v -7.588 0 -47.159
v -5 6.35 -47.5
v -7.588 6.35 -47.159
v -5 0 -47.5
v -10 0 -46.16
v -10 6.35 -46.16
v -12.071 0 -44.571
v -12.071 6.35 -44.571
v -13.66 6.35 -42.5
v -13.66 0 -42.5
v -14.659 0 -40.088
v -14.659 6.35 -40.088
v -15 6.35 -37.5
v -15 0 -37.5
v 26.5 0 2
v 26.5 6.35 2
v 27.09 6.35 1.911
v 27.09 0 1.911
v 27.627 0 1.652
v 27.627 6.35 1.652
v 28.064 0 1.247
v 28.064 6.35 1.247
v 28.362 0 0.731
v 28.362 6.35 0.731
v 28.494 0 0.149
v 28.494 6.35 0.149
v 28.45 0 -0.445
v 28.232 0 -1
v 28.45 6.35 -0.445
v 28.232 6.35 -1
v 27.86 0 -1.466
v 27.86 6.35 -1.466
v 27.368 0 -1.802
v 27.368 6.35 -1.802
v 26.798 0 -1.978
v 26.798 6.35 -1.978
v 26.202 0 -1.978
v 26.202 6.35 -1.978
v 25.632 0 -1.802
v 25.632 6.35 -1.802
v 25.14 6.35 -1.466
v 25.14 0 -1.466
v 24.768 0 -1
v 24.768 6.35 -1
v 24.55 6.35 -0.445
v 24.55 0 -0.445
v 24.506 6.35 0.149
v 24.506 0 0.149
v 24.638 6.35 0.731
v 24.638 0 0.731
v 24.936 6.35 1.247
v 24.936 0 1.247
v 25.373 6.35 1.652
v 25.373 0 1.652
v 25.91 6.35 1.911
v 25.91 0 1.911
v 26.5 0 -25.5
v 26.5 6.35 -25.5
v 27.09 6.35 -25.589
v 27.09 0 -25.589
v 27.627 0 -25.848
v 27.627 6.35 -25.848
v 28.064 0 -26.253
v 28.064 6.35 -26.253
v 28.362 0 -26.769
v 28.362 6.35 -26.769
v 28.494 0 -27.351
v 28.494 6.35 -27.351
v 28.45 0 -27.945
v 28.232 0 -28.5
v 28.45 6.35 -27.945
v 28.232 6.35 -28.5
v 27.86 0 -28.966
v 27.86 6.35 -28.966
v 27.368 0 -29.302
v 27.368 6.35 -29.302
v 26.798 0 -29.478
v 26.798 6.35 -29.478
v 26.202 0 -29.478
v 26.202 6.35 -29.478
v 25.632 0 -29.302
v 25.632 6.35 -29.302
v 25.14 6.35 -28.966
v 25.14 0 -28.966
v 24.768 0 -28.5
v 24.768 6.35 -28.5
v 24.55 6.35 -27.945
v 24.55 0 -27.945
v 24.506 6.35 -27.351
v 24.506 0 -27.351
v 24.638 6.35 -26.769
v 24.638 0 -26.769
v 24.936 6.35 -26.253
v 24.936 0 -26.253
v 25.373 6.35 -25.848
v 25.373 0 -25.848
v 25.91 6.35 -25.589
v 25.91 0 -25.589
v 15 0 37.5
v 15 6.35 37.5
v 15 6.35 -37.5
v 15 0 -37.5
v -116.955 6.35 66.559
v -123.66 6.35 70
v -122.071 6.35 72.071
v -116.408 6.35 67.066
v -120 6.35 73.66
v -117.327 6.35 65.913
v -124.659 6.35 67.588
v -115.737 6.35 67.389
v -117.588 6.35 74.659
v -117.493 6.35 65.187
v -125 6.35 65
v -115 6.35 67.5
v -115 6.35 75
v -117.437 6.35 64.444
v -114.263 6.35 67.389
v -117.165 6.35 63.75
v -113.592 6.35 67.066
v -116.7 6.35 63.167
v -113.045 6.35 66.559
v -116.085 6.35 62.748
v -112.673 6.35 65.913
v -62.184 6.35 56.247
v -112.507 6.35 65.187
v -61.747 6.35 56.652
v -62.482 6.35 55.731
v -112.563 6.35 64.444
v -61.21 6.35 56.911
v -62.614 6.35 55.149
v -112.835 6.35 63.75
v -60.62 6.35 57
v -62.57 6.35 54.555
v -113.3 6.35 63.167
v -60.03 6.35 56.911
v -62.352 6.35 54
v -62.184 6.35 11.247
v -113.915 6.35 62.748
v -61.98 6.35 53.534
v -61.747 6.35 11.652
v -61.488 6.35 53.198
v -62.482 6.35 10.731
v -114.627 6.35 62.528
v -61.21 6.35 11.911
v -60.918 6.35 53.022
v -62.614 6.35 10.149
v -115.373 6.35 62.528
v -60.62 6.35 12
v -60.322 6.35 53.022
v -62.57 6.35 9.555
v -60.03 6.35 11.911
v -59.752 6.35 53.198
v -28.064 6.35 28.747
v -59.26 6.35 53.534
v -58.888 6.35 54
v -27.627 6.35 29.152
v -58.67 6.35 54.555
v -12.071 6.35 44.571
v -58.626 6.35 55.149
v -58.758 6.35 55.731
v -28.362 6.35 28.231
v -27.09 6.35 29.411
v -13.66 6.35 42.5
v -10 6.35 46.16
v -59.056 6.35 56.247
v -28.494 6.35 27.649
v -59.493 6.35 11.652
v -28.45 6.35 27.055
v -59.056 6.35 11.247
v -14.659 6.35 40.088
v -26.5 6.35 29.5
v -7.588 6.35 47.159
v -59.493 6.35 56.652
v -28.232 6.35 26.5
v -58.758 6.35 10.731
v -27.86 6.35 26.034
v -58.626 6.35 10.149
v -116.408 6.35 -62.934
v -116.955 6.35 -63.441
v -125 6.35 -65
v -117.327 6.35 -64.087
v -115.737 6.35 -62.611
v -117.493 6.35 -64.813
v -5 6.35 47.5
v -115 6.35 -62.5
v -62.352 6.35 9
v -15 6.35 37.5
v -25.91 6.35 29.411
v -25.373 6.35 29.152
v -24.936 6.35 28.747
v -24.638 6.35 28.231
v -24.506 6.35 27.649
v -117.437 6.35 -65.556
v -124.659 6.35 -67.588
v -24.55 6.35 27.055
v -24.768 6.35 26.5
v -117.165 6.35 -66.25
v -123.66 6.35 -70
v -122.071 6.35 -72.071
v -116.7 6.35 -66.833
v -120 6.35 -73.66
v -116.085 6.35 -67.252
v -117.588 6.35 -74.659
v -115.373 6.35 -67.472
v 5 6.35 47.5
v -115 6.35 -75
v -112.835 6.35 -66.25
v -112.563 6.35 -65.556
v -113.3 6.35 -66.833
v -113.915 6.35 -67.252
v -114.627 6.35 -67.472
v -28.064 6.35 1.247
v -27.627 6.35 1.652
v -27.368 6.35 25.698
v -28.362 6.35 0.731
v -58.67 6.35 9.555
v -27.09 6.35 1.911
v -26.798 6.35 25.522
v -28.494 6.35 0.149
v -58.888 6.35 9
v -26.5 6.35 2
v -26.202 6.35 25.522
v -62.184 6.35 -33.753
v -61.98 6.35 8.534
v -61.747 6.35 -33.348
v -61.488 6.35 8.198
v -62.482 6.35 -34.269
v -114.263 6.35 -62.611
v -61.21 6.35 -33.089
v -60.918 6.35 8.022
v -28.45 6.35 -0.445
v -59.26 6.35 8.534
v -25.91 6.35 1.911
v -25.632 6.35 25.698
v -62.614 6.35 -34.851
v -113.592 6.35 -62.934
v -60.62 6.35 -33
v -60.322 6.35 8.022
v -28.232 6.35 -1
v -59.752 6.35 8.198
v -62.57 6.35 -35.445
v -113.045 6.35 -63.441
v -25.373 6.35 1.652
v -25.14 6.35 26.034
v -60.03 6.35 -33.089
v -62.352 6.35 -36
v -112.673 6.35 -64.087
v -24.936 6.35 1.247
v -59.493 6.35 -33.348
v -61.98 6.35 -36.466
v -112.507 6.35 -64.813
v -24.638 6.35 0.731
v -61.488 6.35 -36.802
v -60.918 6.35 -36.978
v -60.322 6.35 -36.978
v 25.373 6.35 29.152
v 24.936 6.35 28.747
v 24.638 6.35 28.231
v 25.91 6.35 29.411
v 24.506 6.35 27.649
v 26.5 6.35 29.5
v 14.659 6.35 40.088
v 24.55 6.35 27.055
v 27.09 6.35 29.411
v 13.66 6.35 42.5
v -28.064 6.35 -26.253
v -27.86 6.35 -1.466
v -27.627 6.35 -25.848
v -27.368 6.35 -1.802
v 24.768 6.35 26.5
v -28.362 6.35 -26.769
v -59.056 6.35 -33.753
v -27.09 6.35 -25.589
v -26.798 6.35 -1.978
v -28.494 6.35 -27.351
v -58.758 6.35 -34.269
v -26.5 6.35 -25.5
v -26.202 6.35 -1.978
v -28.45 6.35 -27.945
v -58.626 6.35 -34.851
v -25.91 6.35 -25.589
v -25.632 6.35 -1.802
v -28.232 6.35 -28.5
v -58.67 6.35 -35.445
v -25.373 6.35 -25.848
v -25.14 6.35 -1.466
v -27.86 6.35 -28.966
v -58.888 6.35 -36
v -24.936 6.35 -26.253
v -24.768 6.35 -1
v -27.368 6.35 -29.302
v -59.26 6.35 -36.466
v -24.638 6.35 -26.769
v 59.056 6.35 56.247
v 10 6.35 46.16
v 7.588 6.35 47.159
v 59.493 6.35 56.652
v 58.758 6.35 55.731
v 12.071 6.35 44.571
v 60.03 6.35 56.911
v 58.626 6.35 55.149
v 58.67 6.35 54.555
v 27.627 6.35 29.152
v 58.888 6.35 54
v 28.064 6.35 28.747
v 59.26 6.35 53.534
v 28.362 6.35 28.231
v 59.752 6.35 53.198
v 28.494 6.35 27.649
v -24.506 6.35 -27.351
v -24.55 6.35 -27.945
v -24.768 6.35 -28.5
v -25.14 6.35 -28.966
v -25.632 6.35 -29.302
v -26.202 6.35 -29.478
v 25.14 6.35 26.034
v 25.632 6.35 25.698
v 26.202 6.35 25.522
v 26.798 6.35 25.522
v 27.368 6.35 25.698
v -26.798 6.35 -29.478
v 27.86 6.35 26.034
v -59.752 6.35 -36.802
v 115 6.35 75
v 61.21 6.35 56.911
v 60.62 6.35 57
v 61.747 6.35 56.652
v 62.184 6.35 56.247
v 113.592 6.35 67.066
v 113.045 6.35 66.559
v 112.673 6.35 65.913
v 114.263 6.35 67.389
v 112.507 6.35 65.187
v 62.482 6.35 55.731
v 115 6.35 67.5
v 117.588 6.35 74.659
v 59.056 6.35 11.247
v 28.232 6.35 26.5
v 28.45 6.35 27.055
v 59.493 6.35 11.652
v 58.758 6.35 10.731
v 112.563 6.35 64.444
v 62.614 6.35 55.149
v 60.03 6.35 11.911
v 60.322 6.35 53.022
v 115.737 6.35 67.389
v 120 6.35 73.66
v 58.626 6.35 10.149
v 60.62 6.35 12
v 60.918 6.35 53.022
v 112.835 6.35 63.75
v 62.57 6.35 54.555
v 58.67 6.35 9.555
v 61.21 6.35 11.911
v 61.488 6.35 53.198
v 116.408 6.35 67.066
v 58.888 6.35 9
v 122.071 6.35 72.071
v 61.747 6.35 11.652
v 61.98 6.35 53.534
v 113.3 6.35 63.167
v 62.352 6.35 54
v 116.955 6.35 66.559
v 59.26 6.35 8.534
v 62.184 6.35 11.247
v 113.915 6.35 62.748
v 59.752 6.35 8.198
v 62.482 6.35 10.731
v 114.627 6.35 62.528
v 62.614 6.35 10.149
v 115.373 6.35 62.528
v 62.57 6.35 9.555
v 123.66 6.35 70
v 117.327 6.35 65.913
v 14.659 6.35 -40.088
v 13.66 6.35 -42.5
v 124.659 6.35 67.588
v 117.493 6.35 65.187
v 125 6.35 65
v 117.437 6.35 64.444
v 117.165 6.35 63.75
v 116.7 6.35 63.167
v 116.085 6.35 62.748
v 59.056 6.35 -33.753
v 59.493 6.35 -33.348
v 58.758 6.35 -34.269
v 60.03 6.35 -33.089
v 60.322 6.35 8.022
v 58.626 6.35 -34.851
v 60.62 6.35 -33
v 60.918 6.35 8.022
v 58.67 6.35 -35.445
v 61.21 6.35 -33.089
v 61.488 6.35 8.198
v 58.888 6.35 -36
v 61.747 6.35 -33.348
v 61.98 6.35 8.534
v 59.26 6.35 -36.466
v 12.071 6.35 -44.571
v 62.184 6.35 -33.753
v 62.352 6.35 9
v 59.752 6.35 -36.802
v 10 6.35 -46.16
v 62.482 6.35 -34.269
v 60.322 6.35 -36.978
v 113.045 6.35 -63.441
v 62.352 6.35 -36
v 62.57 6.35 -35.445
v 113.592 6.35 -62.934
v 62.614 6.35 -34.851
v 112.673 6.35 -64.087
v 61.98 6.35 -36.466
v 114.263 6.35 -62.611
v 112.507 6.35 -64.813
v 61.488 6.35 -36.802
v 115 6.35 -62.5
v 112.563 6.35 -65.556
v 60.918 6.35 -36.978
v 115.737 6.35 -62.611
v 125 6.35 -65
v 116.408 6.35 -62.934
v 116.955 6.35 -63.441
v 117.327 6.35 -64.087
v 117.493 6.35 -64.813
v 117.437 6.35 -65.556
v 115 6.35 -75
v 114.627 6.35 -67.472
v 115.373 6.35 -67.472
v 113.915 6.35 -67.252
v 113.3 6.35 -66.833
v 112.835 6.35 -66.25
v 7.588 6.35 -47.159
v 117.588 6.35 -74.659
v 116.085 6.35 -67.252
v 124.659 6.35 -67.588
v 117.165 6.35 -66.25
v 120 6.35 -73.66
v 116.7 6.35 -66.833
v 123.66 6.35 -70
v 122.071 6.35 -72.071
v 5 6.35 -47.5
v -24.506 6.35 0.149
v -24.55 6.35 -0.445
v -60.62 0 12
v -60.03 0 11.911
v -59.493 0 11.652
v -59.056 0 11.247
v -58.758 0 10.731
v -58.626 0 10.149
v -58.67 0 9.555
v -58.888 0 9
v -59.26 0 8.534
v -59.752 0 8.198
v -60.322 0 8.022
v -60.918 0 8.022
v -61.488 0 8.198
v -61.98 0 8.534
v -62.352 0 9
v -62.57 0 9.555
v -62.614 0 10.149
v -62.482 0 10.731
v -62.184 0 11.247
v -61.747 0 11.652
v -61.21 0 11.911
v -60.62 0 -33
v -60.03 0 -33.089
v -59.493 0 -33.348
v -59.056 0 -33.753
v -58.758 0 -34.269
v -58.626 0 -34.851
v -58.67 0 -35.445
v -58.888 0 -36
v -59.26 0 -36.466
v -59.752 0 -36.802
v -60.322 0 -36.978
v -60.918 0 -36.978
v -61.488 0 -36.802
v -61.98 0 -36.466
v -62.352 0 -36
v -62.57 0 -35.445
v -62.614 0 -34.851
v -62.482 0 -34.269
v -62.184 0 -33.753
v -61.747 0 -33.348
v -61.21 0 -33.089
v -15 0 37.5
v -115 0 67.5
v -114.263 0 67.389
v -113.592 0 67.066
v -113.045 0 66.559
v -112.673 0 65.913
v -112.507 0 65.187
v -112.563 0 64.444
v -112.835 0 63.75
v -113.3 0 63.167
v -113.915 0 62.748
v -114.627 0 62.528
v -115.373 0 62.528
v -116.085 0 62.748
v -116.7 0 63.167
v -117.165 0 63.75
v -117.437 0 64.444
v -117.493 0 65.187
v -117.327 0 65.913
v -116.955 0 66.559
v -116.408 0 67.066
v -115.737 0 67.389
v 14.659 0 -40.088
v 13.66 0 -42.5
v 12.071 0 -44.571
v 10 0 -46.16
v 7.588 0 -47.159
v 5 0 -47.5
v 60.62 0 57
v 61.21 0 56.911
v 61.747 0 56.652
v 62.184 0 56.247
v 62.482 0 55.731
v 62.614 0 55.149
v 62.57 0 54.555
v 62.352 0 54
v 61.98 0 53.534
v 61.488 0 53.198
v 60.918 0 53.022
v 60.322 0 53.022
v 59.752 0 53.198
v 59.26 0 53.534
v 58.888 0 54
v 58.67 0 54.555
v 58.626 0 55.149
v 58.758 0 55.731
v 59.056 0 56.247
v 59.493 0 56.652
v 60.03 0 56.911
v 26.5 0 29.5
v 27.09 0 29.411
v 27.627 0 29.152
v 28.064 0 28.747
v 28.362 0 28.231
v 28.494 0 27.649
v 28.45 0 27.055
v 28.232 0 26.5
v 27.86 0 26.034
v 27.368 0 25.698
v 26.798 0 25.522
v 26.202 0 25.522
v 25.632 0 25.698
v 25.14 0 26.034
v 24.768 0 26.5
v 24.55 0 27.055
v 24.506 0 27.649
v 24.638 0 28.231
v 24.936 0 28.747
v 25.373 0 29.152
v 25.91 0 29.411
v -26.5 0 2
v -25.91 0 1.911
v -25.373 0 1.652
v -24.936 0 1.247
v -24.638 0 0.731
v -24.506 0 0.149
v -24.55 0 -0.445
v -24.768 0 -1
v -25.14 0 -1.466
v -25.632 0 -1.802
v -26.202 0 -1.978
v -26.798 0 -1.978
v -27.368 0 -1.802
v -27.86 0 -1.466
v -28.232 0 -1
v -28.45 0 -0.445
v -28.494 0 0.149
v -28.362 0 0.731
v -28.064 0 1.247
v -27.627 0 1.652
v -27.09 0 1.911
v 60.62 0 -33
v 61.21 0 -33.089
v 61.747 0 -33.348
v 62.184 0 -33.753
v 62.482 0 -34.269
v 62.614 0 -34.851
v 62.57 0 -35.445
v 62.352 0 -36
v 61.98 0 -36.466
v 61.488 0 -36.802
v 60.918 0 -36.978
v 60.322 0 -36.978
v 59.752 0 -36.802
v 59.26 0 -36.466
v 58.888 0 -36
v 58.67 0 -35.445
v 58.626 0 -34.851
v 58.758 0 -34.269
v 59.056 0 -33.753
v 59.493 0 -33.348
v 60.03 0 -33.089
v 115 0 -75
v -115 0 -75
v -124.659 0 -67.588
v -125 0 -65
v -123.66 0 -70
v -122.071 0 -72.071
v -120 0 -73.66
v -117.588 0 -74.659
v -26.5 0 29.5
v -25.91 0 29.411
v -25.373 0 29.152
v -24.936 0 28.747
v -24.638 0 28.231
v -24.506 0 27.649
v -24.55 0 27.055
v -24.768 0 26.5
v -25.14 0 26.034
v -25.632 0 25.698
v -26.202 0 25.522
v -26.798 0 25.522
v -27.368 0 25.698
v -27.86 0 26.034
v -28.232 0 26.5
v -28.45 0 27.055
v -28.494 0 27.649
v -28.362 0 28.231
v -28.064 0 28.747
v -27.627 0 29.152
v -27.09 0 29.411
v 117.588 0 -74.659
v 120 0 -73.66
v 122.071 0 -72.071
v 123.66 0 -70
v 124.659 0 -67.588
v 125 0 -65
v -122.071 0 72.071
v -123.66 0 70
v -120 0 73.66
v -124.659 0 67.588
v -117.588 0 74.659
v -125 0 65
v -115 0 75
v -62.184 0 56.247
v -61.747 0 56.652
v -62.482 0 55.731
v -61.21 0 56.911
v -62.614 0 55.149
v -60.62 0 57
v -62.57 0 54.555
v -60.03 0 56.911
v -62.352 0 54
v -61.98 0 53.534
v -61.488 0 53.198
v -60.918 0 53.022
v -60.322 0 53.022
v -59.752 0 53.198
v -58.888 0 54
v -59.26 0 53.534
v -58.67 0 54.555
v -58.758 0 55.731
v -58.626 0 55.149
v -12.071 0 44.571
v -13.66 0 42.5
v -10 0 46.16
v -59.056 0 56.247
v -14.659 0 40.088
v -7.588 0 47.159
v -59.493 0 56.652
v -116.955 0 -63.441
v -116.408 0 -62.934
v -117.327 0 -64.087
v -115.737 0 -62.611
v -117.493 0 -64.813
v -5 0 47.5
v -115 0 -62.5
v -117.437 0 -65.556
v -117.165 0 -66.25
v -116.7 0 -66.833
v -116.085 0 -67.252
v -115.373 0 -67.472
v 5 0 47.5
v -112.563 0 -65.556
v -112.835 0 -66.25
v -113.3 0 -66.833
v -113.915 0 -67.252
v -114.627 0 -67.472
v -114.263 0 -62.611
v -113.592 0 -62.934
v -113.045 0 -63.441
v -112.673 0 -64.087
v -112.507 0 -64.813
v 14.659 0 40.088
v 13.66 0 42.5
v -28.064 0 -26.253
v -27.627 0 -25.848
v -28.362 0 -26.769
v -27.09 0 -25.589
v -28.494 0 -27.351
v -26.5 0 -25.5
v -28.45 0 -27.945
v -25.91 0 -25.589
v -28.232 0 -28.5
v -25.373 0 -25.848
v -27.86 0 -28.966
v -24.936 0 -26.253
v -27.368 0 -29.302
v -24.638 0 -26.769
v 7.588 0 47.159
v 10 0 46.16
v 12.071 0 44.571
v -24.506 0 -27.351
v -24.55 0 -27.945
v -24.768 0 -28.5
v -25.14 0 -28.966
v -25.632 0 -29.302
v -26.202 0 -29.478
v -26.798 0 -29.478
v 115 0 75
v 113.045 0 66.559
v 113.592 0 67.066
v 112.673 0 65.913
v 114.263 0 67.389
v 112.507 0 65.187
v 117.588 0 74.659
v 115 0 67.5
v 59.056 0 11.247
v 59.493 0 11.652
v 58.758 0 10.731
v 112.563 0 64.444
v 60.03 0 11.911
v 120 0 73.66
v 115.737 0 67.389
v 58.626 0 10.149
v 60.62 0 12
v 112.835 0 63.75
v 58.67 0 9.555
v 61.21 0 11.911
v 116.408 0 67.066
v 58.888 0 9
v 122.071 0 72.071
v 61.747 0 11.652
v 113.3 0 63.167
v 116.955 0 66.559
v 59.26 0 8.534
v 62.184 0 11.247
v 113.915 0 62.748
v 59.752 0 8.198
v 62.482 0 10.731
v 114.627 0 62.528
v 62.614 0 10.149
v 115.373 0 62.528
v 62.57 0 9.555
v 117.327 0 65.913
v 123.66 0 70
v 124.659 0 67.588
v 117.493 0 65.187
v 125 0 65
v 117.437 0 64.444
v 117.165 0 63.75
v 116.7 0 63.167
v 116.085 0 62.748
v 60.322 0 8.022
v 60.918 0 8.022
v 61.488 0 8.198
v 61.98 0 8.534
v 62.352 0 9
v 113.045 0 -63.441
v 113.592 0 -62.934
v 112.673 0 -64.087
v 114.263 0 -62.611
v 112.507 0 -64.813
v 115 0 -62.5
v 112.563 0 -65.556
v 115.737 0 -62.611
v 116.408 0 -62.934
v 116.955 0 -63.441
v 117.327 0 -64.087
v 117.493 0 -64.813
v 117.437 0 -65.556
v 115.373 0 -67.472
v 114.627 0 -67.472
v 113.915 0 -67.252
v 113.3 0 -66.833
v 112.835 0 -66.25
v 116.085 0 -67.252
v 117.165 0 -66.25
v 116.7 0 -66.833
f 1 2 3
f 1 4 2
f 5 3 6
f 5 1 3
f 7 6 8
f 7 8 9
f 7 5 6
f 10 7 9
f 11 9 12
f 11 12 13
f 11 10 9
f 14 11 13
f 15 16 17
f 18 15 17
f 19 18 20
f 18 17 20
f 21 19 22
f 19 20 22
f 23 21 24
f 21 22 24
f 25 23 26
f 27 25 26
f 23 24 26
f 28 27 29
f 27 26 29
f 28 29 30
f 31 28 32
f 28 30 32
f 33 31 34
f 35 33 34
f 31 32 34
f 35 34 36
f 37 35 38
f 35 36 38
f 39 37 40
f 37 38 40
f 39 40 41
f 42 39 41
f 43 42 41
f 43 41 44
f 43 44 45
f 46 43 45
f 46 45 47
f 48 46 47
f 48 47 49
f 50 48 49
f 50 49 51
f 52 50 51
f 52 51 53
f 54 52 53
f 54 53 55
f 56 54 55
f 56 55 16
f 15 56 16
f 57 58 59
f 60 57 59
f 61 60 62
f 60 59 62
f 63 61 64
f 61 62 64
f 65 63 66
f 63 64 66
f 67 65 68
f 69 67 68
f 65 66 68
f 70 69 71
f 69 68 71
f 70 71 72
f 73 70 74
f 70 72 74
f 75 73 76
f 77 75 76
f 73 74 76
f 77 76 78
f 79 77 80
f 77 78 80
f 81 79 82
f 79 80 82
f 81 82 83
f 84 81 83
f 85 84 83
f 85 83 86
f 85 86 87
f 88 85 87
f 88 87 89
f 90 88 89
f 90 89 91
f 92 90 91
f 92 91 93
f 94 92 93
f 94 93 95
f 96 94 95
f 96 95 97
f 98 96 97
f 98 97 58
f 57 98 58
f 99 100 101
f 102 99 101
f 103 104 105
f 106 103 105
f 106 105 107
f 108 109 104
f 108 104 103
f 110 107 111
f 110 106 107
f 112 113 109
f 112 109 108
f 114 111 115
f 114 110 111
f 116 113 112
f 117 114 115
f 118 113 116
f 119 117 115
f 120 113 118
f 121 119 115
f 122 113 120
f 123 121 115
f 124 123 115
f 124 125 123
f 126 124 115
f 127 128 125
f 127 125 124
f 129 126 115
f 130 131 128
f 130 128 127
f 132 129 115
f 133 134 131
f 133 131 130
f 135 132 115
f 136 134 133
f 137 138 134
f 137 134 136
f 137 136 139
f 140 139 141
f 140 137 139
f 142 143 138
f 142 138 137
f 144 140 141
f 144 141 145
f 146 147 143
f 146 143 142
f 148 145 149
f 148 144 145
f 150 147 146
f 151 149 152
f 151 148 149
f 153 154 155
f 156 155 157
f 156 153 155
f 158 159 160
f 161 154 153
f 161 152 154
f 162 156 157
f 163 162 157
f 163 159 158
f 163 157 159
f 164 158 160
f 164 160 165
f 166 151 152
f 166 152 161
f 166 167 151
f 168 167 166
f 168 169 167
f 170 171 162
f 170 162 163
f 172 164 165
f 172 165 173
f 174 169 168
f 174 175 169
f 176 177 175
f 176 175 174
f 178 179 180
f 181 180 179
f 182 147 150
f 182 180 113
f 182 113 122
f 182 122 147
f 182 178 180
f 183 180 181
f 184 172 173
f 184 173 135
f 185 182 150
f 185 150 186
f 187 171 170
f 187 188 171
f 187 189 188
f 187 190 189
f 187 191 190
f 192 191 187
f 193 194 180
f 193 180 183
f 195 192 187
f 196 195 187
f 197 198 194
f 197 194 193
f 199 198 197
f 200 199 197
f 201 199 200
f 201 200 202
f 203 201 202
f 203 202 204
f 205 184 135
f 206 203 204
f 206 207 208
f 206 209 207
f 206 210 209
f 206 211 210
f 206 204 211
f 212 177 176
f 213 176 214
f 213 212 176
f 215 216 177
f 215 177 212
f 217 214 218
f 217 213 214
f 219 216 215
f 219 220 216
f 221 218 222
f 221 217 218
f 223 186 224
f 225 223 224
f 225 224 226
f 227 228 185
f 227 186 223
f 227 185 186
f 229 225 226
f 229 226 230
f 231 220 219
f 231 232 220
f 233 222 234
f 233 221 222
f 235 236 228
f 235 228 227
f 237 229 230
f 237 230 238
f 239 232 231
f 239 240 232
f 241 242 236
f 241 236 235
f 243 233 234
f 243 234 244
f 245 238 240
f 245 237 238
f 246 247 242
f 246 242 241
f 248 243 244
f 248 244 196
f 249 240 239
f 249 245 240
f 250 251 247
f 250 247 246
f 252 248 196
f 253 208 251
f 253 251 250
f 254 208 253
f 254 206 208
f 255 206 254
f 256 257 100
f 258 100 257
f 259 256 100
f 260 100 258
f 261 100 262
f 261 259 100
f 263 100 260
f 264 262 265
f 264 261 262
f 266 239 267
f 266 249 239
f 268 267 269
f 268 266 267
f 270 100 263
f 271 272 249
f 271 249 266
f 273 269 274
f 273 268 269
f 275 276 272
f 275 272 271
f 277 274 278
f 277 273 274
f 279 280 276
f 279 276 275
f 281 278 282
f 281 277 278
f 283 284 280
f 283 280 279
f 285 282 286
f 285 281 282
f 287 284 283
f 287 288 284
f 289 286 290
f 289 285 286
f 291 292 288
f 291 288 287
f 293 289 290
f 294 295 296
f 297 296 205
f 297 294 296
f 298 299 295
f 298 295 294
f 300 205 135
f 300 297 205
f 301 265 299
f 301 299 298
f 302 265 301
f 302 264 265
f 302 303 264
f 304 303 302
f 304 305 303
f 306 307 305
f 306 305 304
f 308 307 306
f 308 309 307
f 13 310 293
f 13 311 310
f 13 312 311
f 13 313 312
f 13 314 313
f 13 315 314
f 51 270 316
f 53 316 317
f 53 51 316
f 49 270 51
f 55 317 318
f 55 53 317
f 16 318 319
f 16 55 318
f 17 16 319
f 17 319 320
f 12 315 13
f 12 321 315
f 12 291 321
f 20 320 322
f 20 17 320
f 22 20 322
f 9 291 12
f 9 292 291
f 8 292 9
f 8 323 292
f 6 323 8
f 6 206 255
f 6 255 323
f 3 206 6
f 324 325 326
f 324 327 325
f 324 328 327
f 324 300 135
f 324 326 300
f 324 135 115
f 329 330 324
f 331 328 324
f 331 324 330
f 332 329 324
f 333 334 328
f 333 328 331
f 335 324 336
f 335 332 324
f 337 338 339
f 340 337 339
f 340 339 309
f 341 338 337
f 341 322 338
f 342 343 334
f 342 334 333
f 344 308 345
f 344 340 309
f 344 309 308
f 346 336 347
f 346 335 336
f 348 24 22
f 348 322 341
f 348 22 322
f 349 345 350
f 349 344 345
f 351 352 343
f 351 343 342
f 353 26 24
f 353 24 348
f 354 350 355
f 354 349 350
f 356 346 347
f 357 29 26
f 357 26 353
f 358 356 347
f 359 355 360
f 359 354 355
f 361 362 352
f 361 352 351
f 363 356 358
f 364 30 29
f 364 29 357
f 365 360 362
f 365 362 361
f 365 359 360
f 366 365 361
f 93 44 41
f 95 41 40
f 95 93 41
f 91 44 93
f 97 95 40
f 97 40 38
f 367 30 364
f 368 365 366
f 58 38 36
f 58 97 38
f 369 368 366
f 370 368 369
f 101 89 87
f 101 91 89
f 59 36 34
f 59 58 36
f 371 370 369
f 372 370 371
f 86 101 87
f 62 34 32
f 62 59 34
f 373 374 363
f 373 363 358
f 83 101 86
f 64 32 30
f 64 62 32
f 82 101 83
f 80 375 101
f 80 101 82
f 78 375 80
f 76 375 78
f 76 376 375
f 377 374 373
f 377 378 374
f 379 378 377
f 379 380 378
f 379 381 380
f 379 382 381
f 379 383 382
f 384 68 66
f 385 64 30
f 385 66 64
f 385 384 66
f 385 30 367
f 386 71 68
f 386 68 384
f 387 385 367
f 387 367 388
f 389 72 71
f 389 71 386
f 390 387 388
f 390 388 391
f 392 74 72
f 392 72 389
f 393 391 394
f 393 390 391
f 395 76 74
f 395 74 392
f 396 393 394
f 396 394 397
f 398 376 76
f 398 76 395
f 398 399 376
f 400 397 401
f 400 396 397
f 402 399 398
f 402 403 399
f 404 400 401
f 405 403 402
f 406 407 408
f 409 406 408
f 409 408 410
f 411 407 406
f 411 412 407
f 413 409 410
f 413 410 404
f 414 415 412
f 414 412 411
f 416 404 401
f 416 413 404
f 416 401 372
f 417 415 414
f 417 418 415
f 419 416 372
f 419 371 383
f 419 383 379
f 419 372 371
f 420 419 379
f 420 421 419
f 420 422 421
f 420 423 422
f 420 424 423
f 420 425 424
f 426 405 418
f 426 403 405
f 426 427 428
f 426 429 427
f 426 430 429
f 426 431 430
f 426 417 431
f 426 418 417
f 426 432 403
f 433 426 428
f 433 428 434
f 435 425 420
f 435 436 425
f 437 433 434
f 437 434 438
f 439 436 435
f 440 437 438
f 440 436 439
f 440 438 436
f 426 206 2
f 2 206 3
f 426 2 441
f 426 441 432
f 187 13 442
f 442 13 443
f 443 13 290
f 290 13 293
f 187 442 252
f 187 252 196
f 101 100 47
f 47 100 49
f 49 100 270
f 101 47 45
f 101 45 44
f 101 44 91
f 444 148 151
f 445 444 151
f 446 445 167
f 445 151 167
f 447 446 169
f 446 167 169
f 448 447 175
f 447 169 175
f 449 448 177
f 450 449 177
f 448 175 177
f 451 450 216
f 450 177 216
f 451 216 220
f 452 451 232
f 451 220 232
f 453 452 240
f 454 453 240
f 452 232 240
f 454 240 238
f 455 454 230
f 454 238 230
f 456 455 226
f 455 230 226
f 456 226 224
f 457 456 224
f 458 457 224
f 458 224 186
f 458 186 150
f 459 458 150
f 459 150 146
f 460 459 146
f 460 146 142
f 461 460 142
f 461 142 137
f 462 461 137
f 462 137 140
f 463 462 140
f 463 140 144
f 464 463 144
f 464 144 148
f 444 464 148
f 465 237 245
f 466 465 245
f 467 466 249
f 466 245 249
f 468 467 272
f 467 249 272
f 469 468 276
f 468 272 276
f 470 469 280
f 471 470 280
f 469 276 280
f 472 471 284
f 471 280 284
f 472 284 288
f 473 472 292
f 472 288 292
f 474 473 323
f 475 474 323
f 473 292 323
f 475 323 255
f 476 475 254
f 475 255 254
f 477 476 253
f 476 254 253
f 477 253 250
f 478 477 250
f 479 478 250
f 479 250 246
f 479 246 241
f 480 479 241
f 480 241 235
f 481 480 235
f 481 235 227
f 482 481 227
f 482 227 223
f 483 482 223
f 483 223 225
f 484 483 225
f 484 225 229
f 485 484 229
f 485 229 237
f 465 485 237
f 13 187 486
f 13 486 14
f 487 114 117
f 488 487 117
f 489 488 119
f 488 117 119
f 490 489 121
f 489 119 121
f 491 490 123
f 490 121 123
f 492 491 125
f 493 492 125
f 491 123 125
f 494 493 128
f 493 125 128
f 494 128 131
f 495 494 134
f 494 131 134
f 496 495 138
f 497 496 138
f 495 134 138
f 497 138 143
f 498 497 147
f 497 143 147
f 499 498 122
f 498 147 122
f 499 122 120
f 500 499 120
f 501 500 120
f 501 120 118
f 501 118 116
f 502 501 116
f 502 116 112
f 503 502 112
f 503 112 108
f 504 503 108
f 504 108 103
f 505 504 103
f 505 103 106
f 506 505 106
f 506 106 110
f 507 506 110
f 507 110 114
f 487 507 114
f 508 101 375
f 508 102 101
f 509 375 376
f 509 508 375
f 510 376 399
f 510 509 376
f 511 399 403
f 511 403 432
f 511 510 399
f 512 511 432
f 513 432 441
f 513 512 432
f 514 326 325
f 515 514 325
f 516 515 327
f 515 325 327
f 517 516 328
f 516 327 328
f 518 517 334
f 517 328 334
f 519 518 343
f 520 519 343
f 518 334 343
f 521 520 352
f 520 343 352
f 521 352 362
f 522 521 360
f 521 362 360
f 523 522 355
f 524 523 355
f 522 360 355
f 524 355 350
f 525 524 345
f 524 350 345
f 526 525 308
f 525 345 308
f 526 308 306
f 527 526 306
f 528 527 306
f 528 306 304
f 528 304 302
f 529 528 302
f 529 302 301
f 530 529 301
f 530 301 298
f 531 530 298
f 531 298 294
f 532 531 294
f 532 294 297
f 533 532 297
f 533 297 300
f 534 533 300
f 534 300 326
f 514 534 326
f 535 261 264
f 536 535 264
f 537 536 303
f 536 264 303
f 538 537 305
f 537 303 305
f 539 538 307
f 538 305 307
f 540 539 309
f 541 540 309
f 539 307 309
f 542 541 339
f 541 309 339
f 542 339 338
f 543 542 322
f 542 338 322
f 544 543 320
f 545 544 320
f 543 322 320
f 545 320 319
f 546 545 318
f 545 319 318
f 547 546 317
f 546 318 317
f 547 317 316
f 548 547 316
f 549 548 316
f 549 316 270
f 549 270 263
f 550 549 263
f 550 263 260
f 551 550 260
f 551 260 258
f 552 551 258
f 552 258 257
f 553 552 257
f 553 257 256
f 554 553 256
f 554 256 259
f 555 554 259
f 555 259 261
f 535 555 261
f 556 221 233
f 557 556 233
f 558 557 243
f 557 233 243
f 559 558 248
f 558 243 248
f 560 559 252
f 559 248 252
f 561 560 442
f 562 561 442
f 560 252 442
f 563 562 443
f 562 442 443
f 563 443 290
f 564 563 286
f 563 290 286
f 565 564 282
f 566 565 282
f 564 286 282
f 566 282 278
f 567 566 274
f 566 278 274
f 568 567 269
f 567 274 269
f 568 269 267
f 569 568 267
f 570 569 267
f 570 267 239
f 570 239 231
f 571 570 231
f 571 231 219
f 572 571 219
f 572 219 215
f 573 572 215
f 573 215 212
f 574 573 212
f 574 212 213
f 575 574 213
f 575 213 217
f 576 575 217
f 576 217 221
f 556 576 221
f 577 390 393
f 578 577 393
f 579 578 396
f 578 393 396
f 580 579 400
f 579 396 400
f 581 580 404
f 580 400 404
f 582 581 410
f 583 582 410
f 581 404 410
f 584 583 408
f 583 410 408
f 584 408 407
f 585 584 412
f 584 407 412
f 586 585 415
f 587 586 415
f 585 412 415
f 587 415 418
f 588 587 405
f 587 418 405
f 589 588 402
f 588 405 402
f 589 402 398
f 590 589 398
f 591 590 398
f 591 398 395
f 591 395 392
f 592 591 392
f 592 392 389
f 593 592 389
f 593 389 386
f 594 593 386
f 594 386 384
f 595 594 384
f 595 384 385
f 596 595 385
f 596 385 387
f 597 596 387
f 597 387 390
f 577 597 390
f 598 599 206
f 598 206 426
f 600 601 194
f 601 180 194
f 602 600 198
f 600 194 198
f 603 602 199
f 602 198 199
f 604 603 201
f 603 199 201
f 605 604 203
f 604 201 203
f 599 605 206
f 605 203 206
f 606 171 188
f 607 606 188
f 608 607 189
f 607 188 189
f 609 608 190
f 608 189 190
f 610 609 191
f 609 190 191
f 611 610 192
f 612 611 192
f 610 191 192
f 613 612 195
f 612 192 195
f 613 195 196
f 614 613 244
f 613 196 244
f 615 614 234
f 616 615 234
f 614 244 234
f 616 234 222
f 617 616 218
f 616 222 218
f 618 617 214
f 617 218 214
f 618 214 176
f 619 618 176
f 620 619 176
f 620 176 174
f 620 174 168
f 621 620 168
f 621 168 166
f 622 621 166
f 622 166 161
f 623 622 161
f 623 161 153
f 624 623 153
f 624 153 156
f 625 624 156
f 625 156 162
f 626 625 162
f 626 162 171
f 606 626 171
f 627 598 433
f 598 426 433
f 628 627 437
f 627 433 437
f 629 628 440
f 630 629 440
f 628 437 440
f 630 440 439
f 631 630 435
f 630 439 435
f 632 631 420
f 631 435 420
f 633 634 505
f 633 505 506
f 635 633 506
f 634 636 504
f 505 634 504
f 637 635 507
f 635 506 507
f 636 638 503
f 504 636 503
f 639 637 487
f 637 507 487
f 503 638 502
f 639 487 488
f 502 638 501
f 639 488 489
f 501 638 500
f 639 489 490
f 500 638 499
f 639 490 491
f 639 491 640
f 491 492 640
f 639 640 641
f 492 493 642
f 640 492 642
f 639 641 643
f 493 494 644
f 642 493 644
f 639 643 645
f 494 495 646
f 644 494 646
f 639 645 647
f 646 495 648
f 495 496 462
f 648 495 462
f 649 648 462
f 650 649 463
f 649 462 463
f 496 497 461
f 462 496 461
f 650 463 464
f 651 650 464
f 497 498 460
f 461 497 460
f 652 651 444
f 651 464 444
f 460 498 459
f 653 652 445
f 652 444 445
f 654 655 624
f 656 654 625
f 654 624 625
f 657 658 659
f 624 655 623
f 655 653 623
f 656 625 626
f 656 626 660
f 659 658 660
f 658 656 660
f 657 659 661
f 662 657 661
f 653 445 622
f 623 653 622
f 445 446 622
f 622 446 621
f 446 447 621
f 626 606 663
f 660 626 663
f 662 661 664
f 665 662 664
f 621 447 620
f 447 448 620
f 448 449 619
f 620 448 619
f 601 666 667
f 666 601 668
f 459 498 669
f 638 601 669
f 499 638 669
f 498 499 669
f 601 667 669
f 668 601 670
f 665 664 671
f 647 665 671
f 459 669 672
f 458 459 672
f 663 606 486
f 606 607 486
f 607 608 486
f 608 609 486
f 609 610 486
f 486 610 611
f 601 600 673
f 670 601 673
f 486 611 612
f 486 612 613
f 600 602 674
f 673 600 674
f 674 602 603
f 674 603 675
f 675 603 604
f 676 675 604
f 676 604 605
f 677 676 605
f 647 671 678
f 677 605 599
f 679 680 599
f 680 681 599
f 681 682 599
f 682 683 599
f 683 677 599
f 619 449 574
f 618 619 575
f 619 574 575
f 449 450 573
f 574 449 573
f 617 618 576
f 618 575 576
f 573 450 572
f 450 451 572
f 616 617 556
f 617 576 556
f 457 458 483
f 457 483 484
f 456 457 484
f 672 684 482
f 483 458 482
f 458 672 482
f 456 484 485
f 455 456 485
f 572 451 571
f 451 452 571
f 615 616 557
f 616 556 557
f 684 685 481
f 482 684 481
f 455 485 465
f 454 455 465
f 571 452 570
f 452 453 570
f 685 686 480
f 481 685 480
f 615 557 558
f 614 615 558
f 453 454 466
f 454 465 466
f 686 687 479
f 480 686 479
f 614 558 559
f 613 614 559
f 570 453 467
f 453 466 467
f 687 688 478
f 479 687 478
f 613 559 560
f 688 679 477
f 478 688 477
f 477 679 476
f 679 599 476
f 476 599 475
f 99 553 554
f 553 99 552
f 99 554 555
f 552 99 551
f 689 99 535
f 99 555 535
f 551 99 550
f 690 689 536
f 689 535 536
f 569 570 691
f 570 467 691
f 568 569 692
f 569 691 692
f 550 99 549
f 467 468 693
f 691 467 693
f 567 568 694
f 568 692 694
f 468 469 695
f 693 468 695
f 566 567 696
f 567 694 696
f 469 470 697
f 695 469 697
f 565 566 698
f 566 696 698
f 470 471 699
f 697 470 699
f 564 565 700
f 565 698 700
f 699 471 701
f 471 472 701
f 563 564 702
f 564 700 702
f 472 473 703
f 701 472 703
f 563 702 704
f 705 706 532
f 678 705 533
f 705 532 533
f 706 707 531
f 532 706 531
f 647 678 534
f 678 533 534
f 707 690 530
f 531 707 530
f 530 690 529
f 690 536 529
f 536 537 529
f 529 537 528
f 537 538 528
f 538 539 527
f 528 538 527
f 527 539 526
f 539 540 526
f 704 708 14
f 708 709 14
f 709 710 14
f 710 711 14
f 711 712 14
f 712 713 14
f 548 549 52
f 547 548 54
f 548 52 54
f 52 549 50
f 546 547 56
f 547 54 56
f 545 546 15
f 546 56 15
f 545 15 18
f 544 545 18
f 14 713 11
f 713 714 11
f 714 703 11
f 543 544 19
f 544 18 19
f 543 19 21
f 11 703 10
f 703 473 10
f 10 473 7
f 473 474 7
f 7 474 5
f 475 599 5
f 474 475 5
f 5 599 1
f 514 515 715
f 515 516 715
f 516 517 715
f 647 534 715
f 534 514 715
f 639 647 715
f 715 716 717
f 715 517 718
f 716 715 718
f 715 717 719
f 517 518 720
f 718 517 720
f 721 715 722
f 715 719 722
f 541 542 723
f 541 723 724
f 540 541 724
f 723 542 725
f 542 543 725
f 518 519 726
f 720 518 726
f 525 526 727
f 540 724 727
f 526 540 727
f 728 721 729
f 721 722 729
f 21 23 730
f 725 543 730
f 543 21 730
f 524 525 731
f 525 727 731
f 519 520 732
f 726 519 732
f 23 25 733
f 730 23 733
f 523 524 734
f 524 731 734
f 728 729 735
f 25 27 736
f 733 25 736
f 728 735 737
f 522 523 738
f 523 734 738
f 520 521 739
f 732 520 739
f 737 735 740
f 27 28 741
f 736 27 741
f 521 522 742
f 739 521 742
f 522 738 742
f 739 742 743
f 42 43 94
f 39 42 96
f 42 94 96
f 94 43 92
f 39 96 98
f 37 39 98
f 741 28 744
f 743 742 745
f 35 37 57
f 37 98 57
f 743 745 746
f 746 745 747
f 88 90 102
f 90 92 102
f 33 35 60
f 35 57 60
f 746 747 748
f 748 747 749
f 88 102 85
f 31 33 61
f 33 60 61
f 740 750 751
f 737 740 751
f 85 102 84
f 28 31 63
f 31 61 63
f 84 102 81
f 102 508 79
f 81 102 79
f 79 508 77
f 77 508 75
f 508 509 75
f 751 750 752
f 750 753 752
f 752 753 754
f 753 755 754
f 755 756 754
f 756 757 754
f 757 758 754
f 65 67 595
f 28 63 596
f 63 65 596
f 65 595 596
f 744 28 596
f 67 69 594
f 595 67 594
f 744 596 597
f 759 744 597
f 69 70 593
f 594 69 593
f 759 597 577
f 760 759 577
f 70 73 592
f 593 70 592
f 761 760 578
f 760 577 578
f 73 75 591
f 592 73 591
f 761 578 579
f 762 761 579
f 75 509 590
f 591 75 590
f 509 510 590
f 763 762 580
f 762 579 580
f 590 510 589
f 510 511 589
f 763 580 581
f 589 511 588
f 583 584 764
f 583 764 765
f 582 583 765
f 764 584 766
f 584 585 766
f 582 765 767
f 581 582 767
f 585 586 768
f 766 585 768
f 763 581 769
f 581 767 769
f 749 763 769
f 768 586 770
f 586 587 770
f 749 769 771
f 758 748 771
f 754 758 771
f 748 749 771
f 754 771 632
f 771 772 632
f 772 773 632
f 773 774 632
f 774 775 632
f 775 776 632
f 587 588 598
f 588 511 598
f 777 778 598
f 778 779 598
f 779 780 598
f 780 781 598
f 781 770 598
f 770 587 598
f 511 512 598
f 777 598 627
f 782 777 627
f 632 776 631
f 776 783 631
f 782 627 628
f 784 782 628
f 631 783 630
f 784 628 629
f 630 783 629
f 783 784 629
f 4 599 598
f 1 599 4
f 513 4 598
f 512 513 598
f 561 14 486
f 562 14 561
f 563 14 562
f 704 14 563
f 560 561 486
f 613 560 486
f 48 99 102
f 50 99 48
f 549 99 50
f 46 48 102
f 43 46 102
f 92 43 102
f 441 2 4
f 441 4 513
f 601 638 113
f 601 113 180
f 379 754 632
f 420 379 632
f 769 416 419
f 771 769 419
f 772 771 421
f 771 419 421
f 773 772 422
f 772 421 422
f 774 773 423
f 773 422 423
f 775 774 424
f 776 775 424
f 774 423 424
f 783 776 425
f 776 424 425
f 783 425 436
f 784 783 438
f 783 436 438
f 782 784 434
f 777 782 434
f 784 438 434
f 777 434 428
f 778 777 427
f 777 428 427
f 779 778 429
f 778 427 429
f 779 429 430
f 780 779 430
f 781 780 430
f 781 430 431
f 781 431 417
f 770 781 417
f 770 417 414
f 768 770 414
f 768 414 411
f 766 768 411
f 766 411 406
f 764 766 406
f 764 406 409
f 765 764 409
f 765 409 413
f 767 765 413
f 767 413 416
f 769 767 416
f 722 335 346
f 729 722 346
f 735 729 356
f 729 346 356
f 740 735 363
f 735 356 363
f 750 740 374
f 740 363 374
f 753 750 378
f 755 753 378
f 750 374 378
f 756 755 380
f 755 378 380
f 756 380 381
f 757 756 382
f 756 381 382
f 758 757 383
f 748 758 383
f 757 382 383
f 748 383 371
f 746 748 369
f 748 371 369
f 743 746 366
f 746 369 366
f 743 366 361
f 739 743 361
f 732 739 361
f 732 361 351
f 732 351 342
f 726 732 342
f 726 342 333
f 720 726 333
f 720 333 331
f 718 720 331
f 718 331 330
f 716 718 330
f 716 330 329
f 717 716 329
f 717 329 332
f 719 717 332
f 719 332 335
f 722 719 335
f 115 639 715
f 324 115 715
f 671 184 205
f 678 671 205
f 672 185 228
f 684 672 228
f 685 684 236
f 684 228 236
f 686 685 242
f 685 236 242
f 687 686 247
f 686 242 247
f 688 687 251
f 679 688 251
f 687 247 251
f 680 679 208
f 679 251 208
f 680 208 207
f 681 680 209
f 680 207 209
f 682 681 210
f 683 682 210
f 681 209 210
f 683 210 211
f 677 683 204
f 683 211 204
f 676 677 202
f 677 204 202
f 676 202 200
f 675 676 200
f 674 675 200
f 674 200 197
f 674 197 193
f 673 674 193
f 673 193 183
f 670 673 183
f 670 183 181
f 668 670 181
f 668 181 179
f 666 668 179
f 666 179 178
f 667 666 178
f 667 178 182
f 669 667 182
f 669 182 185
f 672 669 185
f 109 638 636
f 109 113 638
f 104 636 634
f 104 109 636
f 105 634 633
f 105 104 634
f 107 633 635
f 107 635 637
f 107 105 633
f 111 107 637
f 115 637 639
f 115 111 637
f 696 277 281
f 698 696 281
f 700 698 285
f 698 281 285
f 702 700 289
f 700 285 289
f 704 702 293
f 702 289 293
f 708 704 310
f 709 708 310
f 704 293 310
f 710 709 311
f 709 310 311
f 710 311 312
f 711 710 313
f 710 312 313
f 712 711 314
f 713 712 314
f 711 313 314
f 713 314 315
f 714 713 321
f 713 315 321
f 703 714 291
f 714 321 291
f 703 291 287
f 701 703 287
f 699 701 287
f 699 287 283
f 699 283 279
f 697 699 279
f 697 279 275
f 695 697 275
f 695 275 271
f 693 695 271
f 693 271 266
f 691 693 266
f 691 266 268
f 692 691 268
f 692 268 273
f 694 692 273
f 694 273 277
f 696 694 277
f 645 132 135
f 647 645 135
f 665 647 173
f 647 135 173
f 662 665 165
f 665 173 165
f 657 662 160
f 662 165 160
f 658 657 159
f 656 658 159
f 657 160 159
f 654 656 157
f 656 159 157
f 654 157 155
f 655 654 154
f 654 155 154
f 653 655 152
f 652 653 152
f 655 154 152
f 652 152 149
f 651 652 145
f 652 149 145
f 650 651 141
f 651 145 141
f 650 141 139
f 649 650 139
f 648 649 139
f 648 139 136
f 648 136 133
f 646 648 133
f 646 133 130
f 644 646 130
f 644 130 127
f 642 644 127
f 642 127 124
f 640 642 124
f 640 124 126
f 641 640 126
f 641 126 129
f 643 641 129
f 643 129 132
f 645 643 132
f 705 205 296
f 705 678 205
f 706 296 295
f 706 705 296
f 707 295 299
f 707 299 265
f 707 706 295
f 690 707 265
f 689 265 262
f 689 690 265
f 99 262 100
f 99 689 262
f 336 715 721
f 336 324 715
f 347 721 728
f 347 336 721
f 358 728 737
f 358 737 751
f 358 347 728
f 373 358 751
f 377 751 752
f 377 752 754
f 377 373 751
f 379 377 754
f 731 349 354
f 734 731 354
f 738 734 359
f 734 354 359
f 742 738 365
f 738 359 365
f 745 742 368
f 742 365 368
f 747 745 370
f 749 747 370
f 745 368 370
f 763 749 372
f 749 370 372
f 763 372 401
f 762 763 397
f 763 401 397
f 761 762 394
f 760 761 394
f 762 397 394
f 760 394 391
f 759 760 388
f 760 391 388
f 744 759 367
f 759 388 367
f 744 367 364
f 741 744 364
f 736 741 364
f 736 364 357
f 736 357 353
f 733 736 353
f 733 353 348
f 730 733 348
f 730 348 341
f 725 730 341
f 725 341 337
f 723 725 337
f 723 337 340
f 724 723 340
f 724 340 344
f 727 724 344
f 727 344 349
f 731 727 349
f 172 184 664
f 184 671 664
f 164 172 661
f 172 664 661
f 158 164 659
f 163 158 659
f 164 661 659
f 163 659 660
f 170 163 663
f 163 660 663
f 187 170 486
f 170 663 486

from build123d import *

# Parameters (mm, degrees)
SKETCH1_W           = 250
SKETCH1_H           = 150
BOSS_EXTRUDE1_DEPTH = 6.35
SKETCH2_R           = 2.5
SKETCH2_W           = 30
SKETCH2_H           = 95
CUT_EXTRUDE1_DEPTH  = 146.912036858
FILLET1_R           = 10
SKETCH3_R           = 2
CUT_EXTRUDE2_DEPTH  = 146.912036858


with BuildPart() as part:
    # Sketch1 → Boss-Extrude1 (new body)
    with BuildSketch(Plane(origin=(0, 0, 0), x_dir=(1, 0, 0), z_dir=(0, 1, 0))):
        Rectangle(SKETCH1_W, SKETCH1_H)
    extrude(amount=BOSS_EXTRUDE1_DEPTH)

    # Sketch2 → Cut-Extrude1 (cut, through all)
    with BuildSketch(Plane(origin=(0, 6.35, 0), x_dir=(1, 0, 0), z_dir=(0, 1, 0))):
        with Locations(Location((-115, 65, 0), (0, 0, 270))):
            Circle(SKETCH2_R)
        with Locations(Location((115, 65, 0), (0, 0, 270))):
            Circle(SKETCH2_R)
        with Locations(Location((115, -65, 0), (0, 0, 270))):
            Circle(SKETCH2_R)
        with Locations(Location((-115, -65, 0), (0, 0, 270))):
            Circle(SKETCH2_R)
        Rectangle(SKETCH2_W, SKETCH2_H)
    extrude(amount=-CUT_EXTRUDE1_DEPTH, mode=Mode.SUBTRACT)

    # Fillet1
    fillet1_edges = [part.edges().sort_by_distance(p)[0] for p in [
        (-15, 3.175, 47.5),
        (-15, 3.175, -47.5),
        (15, 3.175, -47.5),
        (15, 3.175, 47.5),
        (-125, 3.175, -75),
        (125, 3.175, -75),
        (125, 3.175, 75),
        (-125, 3.175, 75),
    ]]
    fillet(fillet1_edges, radius=FILLET1_R)

    # Sketch3 → Cut-Extrude2 (cut, through all)
    with BuildSketch(Plane(origin=(0, 6.35, 0), x_dir=(1, 0, 0), z_dir=(0, 1, 0))):
        with Locations(Location((-60.62, 35, 0), (0, 0, 270))):
            Circle(SKETCH3_R)
        with Locations(Location((-60.62, -10, 0), (0, 0, 270))):
            Circle(SKETCH3_R)
        with Locations(Location((-60.62, -55, 0), (0, 0, 270))):
            Circle(SKETCH3_R)
        with Locations(Location((60.62, 35, 0), (0, 0, 270))):
            Circle(SKETCH3_R)
        with Locations(Location((60.62, -10, 0), (0, 0, 270))):
            Circle(SKETCH3_R)
        with Locations(Location((60.62, -55, 0), (0, 0, 270))):
            Circle(SKETCH3_R)
        with Locations(Location((-26.5, 27.5, 0), (0, 0, 270))):
            Circle(SKETCH3_R)
        with Locations(Location((-26.5, -27.5, 0), (0, 0, 270))):
            Circle(SKETCH3_R)
        with Locations(Location((26.5, -27.5, 0), (0, 0, 270))):
            Circle(SKETCH3_R)
        with Locations(Location((26.5, 27.5, 0), (0, 0, 270))):
            Circle(SKETCH3_R)
        with Locations(Location((-26.5, 0, 0), (0, 0, 270))):
            Circle(SKETCH3_R)
        with Locations(Location((26.5, 0, 0), (0, 0, 270))):
            Circle(SKETCH3_R)
    extrude(amount=-CUT_EXTRUDE2_DEPTH, mode=Mode.SUBTRACT)


solid = part.part
